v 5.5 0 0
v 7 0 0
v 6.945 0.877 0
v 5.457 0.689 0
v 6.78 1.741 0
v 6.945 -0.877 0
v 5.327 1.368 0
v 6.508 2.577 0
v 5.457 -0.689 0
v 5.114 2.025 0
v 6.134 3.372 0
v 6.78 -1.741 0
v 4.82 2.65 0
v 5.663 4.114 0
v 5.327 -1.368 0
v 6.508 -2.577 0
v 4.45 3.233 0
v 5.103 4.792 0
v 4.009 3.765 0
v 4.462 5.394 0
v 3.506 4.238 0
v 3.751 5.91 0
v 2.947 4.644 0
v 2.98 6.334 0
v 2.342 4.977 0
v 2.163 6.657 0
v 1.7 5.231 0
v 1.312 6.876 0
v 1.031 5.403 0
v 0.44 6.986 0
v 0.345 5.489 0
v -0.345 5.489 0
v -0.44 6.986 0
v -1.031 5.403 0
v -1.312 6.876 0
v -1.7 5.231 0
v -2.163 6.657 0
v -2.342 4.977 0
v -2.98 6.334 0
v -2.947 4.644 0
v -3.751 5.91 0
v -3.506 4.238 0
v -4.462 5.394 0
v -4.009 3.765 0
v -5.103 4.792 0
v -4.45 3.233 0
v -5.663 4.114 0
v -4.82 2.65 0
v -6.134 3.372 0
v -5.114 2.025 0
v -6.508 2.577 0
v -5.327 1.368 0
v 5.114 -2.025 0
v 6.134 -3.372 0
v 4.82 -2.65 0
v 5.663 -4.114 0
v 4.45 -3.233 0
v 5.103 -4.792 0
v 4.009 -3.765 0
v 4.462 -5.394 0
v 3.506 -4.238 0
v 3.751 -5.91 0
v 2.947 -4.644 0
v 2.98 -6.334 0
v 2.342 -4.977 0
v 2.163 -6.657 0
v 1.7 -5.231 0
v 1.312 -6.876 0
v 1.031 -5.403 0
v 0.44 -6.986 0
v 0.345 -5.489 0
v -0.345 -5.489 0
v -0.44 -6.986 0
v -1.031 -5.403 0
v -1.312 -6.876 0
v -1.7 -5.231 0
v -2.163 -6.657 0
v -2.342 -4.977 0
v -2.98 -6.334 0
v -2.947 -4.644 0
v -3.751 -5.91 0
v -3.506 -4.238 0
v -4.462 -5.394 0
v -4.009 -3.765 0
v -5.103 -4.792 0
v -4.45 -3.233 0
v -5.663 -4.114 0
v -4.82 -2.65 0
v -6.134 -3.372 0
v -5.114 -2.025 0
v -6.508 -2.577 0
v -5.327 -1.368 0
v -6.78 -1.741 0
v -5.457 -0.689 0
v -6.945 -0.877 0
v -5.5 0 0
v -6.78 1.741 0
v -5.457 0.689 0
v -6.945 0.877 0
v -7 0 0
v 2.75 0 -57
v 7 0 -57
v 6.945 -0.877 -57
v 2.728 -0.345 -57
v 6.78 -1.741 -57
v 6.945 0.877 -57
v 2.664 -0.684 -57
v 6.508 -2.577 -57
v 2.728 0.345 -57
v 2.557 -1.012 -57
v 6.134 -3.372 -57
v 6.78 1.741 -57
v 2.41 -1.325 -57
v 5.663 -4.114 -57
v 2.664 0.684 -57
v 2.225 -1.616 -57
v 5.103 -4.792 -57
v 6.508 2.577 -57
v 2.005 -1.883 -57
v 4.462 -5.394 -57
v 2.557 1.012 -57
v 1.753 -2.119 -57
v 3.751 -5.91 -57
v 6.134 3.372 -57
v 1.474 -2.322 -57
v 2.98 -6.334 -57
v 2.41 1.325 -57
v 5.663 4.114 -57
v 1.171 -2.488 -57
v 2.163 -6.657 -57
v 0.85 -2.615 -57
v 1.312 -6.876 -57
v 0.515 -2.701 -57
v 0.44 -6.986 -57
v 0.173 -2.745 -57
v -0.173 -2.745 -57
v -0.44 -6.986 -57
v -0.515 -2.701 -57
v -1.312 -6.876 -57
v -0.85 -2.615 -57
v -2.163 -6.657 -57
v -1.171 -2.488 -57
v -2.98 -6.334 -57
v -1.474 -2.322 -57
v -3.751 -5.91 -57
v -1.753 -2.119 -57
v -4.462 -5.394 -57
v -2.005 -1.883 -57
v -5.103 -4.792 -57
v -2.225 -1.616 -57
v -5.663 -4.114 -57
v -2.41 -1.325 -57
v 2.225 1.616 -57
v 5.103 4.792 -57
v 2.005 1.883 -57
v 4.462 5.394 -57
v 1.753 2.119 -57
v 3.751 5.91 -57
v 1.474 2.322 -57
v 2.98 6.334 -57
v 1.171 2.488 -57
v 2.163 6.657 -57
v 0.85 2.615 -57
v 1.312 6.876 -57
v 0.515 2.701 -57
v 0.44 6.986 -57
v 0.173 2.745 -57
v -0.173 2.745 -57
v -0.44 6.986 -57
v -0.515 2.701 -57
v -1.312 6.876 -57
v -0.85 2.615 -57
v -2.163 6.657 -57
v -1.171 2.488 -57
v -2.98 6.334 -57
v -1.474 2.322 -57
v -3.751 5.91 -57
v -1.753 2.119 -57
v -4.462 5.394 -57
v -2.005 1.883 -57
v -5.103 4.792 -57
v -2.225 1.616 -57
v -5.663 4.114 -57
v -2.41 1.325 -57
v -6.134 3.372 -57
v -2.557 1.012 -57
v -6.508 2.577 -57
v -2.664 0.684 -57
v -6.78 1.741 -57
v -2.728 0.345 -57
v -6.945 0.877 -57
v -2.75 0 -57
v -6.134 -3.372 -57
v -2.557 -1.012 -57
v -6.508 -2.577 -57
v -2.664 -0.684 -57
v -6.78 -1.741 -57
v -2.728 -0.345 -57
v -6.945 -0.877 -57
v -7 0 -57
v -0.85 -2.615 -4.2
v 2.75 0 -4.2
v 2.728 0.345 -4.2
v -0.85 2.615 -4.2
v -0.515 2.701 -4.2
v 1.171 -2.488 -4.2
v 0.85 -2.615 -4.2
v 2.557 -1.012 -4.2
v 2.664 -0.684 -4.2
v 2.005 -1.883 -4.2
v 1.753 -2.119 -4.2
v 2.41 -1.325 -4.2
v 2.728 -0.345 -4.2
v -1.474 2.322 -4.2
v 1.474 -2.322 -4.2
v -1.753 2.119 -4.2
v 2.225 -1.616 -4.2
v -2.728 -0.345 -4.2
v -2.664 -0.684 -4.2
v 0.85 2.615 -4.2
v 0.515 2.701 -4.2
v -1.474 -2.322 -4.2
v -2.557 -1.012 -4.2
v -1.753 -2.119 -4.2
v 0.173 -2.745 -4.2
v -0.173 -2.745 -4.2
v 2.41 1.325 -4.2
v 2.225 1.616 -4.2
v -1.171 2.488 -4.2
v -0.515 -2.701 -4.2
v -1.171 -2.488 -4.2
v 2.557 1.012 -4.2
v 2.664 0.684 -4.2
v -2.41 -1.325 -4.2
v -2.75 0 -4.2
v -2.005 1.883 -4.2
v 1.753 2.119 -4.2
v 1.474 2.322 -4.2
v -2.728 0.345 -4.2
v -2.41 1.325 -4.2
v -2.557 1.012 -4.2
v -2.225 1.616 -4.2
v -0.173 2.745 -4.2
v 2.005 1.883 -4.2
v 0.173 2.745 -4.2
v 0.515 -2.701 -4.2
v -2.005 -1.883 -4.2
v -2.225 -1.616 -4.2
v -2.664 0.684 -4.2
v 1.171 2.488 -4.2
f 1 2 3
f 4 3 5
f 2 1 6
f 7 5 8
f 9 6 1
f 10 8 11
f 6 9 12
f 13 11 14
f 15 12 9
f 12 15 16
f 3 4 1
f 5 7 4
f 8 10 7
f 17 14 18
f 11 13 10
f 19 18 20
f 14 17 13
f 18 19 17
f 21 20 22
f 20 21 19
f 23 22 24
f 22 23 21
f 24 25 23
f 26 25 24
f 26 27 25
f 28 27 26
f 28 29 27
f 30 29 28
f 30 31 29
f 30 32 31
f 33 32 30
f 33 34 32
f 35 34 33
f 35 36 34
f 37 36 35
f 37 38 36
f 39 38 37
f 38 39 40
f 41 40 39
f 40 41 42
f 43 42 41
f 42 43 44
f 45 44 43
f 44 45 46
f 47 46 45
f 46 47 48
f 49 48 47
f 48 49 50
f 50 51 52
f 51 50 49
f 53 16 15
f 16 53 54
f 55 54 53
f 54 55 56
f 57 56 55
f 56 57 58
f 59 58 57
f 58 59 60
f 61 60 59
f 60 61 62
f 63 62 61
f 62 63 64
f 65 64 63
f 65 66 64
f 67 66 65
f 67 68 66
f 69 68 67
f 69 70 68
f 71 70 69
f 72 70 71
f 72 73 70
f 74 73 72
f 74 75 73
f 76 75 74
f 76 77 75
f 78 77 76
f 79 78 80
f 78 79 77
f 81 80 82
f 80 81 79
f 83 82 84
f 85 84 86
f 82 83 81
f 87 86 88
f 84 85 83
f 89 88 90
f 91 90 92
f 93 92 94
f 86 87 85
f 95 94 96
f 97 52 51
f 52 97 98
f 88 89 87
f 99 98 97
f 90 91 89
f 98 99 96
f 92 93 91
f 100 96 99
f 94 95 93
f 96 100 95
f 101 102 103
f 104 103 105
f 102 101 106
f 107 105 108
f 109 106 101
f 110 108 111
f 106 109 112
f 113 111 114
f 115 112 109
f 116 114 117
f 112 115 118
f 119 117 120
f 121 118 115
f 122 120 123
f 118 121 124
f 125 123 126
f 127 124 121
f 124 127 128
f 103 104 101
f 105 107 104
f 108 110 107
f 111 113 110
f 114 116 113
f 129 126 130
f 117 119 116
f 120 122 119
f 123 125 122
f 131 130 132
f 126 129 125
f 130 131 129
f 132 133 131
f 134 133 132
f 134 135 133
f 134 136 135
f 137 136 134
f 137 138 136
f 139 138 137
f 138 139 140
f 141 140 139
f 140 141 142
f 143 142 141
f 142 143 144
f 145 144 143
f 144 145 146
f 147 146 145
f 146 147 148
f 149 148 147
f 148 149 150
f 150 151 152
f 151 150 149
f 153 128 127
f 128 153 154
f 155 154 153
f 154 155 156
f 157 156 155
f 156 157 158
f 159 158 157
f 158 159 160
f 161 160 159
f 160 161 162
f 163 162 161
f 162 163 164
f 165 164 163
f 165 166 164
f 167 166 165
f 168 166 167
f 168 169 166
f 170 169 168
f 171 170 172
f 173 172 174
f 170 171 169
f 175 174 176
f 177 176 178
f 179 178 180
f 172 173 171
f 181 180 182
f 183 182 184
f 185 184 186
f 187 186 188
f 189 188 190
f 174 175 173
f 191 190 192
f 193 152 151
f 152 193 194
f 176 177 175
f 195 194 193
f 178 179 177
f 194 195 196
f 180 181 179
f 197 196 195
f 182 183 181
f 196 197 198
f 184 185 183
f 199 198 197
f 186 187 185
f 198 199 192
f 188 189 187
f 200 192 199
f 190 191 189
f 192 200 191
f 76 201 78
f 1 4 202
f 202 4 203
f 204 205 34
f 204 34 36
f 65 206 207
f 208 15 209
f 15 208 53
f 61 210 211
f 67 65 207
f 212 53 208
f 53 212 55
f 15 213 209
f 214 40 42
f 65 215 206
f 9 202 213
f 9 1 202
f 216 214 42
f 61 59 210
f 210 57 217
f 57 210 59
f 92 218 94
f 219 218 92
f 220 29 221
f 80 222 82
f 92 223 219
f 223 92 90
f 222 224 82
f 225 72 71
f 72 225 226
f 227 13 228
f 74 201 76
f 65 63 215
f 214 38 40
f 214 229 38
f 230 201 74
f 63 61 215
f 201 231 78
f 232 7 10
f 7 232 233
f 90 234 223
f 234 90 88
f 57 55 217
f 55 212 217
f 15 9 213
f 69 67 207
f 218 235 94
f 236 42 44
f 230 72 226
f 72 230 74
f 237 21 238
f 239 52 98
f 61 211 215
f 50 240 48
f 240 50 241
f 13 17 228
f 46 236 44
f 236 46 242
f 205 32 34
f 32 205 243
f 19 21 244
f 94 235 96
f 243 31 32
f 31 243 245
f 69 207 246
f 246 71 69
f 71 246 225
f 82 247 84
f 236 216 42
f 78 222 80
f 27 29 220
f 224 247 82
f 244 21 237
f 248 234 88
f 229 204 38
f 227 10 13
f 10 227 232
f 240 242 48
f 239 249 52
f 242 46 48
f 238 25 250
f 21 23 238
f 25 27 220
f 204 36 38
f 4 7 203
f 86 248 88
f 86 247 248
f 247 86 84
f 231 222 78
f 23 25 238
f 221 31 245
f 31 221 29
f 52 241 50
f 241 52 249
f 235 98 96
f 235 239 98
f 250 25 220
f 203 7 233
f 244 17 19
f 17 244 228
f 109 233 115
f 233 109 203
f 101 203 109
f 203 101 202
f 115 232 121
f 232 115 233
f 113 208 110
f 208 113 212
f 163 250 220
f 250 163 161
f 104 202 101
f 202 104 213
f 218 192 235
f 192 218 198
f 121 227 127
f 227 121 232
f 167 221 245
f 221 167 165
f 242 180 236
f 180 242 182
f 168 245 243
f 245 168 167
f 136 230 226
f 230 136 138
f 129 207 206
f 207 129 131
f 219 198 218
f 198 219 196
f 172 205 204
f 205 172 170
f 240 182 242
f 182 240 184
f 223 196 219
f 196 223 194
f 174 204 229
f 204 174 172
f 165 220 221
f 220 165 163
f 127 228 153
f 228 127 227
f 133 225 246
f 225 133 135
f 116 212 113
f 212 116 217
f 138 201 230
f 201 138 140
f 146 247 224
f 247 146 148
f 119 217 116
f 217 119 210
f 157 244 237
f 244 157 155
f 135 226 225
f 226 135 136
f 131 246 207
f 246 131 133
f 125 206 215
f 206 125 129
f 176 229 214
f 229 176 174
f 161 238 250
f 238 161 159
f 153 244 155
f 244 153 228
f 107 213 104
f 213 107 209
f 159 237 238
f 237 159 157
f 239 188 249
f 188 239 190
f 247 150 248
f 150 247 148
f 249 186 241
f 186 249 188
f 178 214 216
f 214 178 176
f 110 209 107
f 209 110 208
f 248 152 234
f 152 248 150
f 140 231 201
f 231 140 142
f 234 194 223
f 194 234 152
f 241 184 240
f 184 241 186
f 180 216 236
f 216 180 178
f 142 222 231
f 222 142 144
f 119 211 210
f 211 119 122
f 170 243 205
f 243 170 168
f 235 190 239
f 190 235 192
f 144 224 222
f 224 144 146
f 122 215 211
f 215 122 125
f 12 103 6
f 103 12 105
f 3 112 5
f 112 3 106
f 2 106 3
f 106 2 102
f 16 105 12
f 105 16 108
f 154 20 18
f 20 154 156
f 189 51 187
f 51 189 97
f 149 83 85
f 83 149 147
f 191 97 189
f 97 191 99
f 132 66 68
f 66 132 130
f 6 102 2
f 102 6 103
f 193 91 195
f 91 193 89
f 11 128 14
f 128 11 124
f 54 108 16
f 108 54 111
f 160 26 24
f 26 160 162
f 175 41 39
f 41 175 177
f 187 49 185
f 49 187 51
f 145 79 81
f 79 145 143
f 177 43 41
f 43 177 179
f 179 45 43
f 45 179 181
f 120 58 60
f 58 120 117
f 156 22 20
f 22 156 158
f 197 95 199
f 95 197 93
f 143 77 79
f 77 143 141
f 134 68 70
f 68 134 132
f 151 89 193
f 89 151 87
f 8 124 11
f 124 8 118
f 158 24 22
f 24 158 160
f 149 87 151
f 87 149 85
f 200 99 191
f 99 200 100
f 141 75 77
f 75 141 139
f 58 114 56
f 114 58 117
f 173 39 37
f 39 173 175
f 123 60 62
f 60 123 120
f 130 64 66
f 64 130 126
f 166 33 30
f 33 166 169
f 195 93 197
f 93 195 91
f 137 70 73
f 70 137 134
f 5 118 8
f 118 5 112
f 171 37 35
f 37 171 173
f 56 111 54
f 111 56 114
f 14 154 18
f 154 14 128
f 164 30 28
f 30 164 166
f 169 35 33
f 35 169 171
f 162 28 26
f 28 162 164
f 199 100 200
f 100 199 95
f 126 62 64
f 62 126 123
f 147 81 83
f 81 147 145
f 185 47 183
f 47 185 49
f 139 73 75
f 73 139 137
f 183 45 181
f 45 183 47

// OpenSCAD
$fn = 50;


difference() {
	union() {
		translate(v = [0, 0, -57.0000000000]) {
			cylinder(h = 57, r = 7.0000000000);
		}
	}
	union() {
		translate(v = [0, 0, 0]) {
			rotate(a = [0, 0, 0]) {
				difference() {
					union() {
						#translate(v = [0, 0, -57.0000000000]) {
							cylinder(h = 57, r = 2.2500000000);
						}
						#translate(v = [0, 0, -4.2000000000]) {
							cylinder(h = 4.2000000000, r1 = 2.7500000000, r2 = 5.5000000000);
						}
						#translate(v = [0, 0, -57.0000000000]) {
							cylinder(h = 57, r = 2.7500000000);
						}
						#translate(v = [0, 0, -57.0000000000]) {
							cylinder(h = 57, r = 2.2500000000);
						}
					}
					union();
				}
			}
		}
	}
}
